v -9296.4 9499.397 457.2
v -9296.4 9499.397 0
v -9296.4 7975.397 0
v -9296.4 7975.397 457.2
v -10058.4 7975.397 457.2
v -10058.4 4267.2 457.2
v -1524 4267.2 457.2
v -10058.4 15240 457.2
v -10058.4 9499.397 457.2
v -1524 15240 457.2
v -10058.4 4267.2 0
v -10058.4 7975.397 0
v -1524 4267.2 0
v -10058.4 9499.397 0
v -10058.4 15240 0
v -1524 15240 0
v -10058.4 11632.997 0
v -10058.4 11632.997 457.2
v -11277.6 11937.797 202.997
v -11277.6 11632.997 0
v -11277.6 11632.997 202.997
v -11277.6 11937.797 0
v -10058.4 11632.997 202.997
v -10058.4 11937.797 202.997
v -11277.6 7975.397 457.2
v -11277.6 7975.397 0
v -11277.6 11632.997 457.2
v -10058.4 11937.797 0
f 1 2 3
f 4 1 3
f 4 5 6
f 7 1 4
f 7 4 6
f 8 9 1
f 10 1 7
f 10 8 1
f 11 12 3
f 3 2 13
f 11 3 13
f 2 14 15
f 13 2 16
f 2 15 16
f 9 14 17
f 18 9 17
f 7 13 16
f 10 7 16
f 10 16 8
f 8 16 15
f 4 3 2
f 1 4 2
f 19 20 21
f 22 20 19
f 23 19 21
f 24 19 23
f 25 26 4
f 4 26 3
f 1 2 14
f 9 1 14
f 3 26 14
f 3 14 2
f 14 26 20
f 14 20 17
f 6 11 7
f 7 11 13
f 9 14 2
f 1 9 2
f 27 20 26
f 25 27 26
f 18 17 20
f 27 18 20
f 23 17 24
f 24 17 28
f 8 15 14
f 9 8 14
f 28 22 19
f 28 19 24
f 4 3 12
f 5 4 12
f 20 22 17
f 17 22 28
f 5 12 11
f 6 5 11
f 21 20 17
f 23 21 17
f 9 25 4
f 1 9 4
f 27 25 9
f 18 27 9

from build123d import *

# Parameters (mm, degrees)
F1_DEPTH = 457.2
F2_DEPTH = 457.2
F0_W     = 1219.2
F0_H     = 304.8
F3_DEPTH = 202.9968


with BuildPart() as f1:
    # F0 (on Top) → F1 (new body)
    with BuildSketch(Plane.XY):
        Polygon((-10058.4, 4267.2), (-1524, 4267.2), (-1524, 15240), (-10058.4, 15240), (-10058.4, 11937.7968), (-10058.4, 11632.9968), (-10058.4, 9499.3968), (-9296.4, 9499.3968), (-9296.4, 7975.3968), (-10058.4, 7975.3968), align=None)
    extrude(amount=F1_DEPTH)


with BuildPart() as f2:
    # F0 (on Top) → F2 (new body)
    with BuildSketch(Plane.XY):
        Polygon((-11277.6, 7975.3968), (-10058.4, 7975.3968), (-9296.4, 7975.3968), (-9296.4, 9499.3968), (-10058.4, 9499.3968), (-10058.4, 11632.9968), (-11277.6, 11632.9968), align=None)
    extrude(amount=F2_DEPTH)


with BuildPart() as f3:
    # F0 (on Top) → F3 (new body)
    with BuildSketch(Plane.XY):
        with Locations((-10668, 11785.3968)):
            Rectangle(F0_W, F0_H)
    extrude(amount=F3_DEPTH)


solid = Compound([f1.part, f2.part, f3.part])
